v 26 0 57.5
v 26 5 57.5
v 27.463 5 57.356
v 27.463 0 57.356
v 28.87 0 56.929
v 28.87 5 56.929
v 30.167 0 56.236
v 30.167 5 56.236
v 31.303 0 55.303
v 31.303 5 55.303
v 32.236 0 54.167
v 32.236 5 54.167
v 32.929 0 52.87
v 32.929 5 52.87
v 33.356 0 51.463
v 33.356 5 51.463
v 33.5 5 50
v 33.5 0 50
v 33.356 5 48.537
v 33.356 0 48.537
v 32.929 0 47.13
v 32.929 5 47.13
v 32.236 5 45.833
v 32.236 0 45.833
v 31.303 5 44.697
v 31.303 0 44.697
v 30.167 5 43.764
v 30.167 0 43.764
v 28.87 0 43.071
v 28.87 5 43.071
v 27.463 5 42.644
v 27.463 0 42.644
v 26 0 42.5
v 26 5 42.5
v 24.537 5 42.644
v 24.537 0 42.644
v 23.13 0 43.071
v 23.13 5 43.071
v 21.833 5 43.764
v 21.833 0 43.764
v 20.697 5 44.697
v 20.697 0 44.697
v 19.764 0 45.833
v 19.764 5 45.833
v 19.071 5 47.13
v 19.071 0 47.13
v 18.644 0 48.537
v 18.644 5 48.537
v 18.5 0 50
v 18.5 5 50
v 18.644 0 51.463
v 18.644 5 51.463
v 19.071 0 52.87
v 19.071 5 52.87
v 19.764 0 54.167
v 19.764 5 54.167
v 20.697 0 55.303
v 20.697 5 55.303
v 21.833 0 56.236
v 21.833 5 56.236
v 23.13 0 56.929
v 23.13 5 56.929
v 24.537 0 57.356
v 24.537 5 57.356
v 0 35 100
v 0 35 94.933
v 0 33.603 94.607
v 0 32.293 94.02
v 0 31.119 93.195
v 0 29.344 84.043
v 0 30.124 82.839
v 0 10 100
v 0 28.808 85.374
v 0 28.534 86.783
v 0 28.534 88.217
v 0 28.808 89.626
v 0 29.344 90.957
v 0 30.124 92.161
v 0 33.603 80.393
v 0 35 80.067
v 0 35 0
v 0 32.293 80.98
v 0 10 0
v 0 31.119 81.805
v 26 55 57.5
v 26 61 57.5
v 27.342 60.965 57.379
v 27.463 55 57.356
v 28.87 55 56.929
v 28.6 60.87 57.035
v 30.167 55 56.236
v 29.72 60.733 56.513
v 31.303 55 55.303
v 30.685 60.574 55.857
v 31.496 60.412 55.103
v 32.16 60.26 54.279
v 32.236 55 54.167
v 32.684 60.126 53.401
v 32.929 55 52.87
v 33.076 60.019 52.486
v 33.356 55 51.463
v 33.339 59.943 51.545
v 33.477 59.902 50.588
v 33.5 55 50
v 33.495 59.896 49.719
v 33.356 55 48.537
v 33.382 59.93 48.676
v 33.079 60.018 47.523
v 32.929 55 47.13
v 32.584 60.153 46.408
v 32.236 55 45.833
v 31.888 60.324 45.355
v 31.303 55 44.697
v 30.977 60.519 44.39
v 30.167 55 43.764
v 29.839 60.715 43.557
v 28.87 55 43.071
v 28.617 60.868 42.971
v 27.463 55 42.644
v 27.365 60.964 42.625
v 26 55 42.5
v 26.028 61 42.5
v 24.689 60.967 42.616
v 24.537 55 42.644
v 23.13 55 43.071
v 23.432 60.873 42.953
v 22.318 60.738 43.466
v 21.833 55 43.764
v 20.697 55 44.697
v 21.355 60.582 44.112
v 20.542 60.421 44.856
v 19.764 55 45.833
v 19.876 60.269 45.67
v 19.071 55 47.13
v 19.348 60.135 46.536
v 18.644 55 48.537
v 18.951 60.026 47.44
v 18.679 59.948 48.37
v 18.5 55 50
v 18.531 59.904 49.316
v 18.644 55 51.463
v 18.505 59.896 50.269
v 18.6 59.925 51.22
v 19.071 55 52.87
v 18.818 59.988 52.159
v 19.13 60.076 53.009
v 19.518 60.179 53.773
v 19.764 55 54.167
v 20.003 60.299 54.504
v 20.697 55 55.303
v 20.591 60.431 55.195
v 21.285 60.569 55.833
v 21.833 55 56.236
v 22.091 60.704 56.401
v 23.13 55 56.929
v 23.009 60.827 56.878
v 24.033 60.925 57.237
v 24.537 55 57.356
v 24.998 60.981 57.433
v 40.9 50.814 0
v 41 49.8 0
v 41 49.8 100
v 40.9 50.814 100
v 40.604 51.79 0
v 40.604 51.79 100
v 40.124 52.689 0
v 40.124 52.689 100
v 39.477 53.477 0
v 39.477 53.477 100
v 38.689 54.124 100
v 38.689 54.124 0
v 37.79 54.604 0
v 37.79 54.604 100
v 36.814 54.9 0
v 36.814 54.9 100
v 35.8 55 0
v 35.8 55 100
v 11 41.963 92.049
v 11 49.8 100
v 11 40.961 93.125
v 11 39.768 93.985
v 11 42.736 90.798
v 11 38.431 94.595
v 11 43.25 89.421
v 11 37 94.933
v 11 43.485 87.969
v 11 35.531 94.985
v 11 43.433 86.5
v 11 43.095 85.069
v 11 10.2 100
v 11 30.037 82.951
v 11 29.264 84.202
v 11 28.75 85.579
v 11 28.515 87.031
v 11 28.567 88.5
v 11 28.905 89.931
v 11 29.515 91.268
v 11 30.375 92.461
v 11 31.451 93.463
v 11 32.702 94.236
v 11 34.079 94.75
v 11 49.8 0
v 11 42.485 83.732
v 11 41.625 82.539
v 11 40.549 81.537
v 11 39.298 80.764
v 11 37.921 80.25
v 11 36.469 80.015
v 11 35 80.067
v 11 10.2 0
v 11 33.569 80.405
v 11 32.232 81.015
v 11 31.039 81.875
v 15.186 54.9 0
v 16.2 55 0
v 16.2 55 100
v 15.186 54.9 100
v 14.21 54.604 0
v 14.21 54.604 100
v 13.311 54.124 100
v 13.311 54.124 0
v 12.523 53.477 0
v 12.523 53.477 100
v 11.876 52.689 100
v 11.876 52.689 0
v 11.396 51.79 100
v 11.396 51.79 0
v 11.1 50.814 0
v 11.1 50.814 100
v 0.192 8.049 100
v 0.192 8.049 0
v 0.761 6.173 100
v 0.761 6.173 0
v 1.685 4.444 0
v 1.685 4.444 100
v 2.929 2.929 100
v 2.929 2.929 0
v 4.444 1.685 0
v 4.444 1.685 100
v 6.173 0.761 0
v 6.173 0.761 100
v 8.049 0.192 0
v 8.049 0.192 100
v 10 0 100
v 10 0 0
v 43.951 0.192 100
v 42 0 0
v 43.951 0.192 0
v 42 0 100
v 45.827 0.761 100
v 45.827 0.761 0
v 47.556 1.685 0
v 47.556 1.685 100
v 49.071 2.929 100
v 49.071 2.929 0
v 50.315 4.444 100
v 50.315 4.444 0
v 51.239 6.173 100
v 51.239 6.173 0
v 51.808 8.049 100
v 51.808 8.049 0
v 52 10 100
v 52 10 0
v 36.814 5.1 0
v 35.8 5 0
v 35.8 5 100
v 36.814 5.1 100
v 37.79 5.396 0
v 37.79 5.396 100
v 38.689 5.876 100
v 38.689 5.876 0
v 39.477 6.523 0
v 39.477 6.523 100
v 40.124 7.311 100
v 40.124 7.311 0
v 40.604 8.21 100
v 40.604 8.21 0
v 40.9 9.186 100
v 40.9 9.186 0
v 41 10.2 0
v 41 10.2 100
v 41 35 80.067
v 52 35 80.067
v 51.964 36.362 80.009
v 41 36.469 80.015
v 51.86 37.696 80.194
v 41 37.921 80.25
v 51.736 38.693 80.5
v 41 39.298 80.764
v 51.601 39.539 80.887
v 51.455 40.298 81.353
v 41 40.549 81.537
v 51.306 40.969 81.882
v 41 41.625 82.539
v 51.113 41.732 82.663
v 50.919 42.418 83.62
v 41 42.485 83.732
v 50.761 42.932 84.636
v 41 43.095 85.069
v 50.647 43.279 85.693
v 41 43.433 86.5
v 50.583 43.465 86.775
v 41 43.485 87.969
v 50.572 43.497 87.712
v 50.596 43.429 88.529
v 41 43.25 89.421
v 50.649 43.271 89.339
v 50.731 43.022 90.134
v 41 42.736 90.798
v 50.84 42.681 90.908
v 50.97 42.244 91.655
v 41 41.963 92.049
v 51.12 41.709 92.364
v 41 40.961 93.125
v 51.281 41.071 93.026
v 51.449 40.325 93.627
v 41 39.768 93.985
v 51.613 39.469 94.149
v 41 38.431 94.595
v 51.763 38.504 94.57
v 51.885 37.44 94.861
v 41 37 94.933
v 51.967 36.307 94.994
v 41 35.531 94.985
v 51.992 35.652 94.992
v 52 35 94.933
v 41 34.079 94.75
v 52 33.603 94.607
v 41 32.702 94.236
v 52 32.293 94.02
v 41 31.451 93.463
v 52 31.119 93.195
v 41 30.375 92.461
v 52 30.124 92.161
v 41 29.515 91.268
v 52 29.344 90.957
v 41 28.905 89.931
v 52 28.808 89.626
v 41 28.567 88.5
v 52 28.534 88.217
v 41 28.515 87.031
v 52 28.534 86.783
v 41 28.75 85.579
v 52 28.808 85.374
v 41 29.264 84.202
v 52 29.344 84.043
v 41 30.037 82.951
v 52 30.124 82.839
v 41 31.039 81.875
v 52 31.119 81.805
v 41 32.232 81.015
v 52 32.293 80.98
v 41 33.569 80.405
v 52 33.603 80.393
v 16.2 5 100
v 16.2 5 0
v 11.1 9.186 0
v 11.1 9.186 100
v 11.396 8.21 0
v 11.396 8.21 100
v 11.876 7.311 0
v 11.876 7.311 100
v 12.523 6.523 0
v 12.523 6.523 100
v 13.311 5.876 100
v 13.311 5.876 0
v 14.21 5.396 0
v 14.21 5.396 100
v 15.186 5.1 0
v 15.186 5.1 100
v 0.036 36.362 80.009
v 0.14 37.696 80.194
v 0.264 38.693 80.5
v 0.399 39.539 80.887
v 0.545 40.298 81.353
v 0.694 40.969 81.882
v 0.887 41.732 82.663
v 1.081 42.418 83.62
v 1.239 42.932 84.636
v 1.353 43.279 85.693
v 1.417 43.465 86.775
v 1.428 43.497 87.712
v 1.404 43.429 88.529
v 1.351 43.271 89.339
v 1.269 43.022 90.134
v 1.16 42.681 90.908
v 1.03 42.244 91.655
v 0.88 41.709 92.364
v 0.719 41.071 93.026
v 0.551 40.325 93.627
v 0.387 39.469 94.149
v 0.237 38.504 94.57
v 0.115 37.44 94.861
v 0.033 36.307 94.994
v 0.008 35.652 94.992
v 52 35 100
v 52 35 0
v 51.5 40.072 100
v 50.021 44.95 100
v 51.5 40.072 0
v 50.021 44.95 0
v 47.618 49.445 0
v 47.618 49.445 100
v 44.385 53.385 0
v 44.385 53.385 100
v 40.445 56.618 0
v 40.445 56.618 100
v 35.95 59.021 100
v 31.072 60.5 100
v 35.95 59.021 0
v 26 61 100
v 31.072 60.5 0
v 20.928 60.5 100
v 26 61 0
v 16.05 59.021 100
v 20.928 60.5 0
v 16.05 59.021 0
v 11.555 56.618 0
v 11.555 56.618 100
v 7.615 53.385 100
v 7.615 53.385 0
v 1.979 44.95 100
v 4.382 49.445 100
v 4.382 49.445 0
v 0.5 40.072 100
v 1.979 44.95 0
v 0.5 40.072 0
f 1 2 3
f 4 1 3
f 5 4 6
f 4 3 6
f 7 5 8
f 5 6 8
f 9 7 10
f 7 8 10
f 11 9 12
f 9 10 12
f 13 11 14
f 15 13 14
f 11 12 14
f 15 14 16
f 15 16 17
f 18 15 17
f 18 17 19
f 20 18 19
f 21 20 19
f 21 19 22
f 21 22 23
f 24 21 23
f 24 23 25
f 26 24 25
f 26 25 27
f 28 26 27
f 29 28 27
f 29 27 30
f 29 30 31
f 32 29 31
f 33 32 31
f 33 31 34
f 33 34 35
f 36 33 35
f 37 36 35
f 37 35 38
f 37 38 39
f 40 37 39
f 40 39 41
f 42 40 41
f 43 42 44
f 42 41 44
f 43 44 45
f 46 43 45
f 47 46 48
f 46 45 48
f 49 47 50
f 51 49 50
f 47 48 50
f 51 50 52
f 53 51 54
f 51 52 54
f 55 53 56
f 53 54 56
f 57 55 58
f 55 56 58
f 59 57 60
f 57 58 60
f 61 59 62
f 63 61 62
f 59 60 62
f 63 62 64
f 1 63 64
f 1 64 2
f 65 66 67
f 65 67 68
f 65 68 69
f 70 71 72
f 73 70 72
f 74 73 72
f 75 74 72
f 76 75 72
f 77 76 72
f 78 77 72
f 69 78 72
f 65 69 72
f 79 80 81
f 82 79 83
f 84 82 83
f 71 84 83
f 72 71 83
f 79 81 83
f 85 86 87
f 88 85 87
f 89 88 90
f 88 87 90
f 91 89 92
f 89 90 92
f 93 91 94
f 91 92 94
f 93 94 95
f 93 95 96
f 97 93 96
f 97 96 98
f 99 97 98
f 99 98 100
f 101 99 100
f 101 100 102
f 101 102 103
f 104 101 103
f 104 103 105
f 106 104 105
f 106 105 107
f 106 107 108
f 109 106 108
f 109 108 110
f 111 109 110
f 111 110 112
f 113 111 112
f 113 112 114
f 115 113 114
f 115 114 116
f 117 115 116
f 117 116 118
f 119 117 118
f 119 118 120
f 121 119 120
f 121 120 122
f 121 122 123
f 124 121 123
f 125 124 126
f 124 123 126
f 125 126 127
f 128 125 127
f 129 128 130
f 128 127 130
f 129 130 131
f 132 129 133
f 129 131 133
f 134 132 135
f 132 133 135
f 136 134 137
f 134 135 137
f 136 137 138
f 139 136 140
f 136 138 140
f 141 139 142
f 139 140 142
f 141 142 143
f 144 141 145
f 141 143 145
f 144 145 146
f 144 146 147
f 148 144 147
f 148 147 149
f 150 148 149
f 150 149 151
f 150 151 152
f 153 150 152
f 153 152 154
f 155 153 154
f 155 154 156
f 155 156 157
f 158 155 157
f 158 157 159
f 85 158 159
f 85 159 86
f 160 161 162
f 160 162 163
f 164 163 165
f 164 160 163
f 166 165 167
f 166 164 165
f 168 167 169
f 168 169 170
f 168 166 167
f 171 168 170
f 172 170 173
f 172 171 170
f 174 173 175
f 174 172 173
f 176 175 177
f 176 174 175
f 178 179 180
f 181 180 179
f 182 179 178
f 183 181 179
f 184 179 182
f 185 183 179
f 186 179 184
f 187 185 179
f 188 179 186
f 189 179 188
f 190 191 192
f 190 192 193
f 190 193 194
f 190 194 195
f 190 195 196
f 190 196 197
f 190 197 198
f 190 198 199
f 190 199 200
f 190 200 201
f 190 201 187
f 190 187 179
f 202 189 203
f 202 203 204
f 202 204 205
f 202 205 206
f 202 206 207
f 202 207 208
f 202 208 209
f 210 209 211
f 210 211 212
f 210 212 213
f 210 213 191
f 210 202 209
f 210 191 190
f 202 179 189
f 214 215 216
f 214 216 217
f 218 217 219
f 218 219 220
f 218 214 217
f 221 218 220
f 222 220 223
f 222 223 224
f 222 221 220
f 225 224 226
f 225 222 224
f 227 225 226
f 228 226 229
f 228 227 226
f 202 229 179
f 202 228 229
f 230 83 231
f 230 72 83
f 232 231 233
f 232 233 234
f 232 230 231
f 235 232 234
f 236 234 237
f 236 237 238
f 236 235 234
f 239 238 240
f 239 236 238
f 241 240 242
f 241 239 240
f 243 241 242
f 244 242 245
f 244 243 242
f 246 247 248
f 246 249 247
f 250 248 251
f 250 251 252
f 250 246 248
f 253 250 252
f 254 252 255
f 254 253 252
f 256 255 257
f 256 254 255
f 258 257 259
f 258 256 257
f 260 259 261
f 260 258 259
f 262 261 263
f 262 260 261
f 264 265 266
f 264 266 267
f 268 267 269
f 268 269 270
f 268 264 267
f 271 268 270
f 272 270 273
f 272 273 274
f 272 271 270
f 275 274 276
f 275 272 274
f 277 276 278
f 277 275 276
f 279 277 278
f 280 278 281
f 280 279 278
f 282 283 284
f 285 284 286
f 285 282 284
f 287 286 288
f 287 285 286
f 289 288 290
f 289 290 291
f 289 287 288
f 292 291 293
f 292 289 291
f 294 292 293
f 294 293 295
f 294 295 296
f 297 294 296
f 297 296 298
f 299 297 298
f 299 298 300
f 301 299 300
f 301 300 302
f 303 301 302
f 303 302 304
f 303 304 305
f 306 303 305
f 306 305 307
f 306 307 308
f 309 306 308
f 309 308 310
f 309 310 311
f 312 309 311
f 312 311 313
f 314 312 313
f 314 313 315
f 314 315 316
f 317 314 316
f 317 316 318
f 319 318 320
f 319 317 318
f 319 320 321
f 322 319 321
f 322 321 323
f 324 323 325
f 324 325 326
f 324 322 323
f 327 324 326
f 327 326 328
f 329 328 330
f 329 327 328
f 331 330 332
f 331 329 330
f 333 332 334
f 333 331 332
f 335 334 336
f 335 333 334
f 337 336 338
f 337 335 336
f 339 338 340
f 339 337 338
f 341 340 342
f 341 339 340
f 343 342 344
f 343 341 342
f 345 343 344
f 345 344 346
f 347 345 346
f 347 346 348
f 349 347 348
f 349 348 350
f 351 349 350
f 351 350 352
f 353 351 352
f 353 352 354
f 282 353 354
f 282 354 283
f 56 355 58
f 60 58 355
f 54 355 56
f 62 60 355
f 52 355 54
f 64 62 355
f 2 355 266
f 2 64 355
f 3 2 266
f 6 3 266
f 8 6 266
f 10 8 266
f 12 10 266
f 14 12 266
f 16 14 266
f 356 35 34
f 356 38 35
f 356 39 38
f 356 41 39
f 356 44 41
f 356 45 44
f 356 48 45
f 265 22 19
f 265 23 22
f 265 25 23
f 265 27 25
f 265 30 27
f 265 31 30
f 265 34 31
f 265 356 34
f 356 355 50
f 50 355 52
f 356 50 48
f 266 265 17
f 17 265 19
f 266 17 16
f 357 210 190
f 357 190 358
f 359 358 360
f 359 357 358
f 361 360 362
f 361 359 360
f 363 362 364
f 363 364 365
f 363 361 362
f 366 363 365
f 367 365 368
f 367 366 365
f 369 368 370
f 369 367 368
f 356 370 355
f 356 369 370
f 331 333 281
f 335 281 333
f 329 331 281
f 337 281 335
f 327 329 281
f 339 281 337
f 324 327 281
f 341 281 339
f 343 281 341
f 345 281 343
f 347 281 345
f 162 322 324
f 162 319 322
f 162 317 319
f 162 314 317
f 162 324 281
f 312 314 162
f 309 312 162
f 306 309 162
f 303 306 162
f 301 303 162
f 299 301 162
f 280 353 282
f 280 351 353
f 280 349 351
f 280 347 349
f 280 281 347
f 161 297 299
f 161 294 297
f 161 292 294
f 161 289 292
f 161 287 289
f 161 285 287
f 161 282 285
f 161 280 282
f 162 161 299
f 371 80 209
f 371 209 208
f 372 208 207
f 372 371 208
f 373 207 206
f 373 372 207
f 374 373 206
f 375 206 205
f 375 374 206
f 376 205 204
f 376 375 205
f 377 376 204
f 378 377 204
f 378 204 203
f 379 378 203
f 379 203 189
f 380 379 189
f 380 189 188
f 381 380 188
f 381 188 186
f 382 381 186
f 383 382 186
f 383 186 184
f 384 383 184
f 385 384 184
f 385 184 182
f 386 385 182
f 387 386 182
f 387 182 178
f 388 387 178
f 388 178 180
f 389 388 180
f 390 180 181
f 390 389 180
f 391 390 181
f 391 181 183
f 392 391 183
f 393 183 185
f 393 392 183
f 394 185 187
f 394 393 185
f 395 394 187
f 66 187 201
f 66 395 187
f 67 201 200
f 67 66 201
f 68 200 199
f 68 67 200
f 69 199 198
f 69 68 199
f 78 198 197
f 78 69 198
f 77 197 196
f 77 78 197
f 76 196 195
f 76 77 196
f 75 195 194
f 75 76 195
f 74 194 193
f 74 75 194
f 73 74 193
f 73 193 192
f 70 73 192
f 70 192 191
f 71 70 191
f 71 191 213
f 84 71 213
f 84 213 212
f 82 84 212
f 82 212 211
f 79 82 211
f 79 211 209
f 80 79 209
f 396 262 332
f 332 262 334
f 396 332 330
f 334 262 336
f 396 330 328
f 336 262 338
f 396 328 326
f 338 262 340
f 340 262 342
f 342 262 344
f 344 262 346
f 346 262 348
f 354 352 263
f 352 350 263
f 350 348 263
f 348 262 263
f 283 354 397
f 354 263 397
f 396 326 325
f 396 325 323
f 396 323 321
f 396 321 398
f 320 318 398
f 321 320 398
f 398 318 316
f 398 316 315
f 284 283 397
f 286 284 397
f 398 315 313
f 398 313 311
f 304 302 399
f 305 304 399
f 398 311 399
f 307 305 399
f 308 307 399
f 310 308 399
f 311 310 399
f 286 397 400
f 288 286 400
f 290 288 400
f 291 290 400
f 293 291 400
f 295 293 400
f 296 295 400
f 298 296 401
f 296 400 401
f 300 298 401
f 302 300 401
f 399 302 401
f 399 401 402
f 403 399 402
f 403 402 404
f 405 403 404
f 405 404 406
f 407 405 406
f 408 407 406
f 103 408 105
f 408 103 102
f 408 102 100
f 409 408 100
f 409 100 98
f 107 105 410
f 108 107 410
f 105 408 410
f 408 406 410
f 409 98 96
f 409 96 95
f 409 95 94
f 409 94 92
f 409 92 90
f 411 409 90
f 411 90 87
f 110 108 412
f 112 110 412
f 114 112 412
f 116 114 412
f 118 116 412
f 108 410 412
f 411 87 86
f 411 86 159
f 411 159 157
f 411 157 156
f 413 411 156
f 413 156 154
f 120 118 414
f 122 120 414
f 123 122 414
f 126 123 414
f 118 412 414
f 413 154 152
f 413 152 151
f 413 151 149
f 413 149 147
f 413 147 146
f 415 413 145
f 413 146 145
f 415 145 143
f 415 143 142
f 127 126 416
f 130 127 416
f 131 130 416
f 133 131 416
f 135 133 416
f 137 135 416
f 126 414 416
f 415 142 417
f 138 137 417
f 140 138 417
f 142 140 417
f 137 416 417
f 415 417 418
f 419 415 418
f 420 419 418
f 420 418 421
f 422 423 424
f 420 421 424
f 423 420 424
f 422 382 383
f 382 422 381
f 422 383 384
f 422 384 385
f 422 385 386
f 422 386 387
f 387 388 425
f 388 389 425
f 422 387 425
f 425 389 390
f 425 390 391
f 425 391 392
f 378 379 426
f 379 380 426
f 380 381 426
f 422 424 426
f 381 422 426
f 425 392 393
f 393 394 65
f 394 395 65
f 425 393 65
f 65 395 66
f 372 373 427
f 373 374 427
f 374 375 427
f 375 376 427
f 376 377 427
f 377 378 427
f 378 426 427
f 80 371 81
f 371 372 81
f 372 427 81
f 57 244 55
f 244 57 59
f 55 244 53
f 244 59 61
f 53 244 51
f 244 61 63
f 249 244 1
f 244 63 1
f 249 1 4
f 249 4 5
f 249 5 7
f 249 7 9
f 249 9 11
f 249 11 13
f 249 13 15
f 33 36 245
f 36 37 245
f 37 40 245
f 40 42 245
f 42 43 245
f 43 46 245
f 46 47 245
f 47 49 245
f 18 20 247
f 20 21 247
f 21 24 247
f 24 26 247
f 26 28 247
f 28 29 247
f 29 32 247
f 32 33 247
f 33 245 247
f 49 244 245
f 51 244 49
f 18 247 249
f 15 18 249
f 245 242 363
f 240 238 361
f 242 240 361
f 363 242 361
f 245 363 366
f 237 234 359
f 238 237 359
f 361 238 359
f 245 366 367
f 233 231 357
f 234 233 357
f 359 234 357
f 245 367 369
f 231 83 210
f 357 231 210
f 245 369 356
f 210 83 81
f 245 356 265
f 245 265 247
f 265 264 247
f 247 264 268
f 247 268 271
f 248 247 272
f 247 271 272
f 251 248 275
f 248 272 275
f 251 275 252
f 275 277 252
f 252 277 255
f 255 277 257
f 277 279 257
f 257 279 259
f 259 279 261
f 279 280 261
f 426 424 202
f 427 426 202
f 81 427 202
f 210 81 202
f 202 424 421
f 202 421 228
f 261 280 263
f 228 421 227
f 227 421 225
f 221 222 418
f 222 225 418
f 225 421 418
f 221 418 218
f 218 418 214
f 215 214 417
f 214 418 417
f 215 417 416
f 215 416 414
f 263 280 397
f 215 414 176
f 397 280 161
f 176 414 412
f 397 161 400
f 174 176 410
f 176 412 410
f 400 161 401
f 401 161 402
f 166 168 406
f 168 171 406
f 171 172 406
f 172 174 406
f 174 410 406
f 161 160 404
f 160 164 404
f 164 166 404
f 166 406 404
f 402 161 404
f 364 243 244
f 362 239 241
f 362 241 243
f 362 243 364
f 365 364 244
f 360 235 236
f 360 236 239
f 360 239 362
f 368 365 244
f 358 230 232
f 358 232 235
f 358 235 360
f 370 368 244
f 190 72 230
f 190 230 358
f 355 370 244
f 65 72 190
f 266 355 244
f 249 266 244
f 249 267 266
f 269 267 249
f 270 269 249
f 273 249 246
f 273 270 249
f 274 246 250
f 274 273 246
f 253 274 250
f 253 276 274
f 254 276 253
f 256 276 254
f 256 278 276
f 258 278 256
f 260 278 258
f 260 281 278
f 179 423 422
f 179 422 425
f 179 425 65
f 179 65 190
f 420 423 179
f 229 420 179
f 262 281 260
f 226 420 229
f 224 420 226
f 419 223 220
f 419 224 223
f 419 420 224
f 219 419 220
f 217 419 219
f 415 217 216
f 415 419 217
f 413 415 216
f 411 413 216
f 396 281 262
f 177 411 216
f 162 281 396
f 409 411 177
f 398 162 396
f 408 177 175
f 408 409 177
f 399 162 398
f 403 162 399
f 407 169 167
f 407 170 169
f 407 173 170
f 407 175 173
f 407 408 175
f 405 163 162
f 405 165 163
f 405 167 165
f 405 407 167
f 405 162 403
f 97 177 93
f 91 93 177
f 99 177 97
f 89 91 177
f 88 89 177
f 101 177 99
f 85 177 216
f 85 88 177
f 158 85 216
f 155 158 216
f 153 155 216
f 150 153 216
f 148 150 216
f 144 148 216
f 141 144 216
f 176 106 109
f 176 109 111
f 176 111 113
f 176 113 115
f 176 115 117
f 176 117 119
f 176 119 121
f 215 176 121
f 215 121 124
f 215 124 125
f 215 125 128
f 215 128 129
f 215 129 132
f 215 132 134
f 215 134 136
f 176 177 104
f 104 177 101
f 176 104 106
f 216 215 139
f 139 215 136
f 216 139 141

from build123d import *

# Parameters (mm, degrees)
BOSS_EXTRUDE1_DEPTH     = 100
FILLET3_R               = 10
SKETCH2_R               = 7.5
CUT_EXTRUDE1_DEPTH      = 133.680066325
CUT_EXTRUDE5_DEPTH      = 129.160056346
CUT_EXTRUDE5_DEPTH_BACK = 129.160056346
SKETCH3_R               = 7.5


with BuildPart() as part:
    # Sketch1 → Boss-Extrude1 (new body)
    with BuildSketch(Plane.XY):
        with BuildLine():
            Line((0, 35), (0, 0))
            Line((0, 0), (52, 0))
            Line((52, 0), (52, 35))
            ThreePointArc((52, 35), (26, 61), (0, 35))
        make_face()
        with BuildLine():
            Line((11, 49.8), (11, 10.2))
            ThreePointArc((11, 10.2), (12.523044738, 6.523044738), (16.2, 5))
            Line((16.2, 5), (35.8, 5))
            ThreePointArc((35.8, 5), (39.476955262, 6.523044738), (41, 10.2))
            Line((41, 10.2), (41, 49.8))
            ThreePointArc((41, 49.8), (39.476955262, 53.476955262), (35.8, 55))
            Line((35.8, 55), (16.2, 55))
            ThreePointArc((16.2, 55), (12.523044738, 53.476955262), (11, 49.8))
        make_face(mode=Mode.SUBTRACT)
    extrude(amount=BOSS_EXTRUDE1_DEPTH)

    # Fillet3
    fillet3_edges = [part.edges().sort_by_distance(p)[0] for p in [
        (52, 0, 50),
        (0, 0, 50),
    ]]
    fillet(fillet3_edges, radius=FILLET3_R)

    # Sketch2 → Cut-Extrude1 (cut, through all)
    with BuildSketch(Plane(origin=(0, 70, 0), x_dir=(1, 0, 0), z_dir=(0, 1, 0))):
        with Locations(Location((26, -50, 0), (0, 0, 270))):
            Circle(SKETCH2_R)
    extrude(amount=-CUT_EXTRUDE1_DEPTH, mode=Mode.SUBTRACT)

    # Sketch3 → Cut-Extrude5 (cut, two sides: drawn at the far end of the back side and taken through both)
    with BuildSketch(Plane(origin=(0, 0, 0), x_dir=(0, 0, -1), z_dir=(1, 0, 0)).offset(-CUT_EXTRUDE5_DEPTH_BACK)):
        with Locations(Location((-87.5, 36, 0), (0, 0, 352.337744339))):
            Circle(SKETCH3_R)
    extrude(amount=CUT_EXTRUDE5_DEPTH + CUT_EXTRUDE5_DEPTH_BACK, mode=Mode.SUBTRACT)


solid = part.part
